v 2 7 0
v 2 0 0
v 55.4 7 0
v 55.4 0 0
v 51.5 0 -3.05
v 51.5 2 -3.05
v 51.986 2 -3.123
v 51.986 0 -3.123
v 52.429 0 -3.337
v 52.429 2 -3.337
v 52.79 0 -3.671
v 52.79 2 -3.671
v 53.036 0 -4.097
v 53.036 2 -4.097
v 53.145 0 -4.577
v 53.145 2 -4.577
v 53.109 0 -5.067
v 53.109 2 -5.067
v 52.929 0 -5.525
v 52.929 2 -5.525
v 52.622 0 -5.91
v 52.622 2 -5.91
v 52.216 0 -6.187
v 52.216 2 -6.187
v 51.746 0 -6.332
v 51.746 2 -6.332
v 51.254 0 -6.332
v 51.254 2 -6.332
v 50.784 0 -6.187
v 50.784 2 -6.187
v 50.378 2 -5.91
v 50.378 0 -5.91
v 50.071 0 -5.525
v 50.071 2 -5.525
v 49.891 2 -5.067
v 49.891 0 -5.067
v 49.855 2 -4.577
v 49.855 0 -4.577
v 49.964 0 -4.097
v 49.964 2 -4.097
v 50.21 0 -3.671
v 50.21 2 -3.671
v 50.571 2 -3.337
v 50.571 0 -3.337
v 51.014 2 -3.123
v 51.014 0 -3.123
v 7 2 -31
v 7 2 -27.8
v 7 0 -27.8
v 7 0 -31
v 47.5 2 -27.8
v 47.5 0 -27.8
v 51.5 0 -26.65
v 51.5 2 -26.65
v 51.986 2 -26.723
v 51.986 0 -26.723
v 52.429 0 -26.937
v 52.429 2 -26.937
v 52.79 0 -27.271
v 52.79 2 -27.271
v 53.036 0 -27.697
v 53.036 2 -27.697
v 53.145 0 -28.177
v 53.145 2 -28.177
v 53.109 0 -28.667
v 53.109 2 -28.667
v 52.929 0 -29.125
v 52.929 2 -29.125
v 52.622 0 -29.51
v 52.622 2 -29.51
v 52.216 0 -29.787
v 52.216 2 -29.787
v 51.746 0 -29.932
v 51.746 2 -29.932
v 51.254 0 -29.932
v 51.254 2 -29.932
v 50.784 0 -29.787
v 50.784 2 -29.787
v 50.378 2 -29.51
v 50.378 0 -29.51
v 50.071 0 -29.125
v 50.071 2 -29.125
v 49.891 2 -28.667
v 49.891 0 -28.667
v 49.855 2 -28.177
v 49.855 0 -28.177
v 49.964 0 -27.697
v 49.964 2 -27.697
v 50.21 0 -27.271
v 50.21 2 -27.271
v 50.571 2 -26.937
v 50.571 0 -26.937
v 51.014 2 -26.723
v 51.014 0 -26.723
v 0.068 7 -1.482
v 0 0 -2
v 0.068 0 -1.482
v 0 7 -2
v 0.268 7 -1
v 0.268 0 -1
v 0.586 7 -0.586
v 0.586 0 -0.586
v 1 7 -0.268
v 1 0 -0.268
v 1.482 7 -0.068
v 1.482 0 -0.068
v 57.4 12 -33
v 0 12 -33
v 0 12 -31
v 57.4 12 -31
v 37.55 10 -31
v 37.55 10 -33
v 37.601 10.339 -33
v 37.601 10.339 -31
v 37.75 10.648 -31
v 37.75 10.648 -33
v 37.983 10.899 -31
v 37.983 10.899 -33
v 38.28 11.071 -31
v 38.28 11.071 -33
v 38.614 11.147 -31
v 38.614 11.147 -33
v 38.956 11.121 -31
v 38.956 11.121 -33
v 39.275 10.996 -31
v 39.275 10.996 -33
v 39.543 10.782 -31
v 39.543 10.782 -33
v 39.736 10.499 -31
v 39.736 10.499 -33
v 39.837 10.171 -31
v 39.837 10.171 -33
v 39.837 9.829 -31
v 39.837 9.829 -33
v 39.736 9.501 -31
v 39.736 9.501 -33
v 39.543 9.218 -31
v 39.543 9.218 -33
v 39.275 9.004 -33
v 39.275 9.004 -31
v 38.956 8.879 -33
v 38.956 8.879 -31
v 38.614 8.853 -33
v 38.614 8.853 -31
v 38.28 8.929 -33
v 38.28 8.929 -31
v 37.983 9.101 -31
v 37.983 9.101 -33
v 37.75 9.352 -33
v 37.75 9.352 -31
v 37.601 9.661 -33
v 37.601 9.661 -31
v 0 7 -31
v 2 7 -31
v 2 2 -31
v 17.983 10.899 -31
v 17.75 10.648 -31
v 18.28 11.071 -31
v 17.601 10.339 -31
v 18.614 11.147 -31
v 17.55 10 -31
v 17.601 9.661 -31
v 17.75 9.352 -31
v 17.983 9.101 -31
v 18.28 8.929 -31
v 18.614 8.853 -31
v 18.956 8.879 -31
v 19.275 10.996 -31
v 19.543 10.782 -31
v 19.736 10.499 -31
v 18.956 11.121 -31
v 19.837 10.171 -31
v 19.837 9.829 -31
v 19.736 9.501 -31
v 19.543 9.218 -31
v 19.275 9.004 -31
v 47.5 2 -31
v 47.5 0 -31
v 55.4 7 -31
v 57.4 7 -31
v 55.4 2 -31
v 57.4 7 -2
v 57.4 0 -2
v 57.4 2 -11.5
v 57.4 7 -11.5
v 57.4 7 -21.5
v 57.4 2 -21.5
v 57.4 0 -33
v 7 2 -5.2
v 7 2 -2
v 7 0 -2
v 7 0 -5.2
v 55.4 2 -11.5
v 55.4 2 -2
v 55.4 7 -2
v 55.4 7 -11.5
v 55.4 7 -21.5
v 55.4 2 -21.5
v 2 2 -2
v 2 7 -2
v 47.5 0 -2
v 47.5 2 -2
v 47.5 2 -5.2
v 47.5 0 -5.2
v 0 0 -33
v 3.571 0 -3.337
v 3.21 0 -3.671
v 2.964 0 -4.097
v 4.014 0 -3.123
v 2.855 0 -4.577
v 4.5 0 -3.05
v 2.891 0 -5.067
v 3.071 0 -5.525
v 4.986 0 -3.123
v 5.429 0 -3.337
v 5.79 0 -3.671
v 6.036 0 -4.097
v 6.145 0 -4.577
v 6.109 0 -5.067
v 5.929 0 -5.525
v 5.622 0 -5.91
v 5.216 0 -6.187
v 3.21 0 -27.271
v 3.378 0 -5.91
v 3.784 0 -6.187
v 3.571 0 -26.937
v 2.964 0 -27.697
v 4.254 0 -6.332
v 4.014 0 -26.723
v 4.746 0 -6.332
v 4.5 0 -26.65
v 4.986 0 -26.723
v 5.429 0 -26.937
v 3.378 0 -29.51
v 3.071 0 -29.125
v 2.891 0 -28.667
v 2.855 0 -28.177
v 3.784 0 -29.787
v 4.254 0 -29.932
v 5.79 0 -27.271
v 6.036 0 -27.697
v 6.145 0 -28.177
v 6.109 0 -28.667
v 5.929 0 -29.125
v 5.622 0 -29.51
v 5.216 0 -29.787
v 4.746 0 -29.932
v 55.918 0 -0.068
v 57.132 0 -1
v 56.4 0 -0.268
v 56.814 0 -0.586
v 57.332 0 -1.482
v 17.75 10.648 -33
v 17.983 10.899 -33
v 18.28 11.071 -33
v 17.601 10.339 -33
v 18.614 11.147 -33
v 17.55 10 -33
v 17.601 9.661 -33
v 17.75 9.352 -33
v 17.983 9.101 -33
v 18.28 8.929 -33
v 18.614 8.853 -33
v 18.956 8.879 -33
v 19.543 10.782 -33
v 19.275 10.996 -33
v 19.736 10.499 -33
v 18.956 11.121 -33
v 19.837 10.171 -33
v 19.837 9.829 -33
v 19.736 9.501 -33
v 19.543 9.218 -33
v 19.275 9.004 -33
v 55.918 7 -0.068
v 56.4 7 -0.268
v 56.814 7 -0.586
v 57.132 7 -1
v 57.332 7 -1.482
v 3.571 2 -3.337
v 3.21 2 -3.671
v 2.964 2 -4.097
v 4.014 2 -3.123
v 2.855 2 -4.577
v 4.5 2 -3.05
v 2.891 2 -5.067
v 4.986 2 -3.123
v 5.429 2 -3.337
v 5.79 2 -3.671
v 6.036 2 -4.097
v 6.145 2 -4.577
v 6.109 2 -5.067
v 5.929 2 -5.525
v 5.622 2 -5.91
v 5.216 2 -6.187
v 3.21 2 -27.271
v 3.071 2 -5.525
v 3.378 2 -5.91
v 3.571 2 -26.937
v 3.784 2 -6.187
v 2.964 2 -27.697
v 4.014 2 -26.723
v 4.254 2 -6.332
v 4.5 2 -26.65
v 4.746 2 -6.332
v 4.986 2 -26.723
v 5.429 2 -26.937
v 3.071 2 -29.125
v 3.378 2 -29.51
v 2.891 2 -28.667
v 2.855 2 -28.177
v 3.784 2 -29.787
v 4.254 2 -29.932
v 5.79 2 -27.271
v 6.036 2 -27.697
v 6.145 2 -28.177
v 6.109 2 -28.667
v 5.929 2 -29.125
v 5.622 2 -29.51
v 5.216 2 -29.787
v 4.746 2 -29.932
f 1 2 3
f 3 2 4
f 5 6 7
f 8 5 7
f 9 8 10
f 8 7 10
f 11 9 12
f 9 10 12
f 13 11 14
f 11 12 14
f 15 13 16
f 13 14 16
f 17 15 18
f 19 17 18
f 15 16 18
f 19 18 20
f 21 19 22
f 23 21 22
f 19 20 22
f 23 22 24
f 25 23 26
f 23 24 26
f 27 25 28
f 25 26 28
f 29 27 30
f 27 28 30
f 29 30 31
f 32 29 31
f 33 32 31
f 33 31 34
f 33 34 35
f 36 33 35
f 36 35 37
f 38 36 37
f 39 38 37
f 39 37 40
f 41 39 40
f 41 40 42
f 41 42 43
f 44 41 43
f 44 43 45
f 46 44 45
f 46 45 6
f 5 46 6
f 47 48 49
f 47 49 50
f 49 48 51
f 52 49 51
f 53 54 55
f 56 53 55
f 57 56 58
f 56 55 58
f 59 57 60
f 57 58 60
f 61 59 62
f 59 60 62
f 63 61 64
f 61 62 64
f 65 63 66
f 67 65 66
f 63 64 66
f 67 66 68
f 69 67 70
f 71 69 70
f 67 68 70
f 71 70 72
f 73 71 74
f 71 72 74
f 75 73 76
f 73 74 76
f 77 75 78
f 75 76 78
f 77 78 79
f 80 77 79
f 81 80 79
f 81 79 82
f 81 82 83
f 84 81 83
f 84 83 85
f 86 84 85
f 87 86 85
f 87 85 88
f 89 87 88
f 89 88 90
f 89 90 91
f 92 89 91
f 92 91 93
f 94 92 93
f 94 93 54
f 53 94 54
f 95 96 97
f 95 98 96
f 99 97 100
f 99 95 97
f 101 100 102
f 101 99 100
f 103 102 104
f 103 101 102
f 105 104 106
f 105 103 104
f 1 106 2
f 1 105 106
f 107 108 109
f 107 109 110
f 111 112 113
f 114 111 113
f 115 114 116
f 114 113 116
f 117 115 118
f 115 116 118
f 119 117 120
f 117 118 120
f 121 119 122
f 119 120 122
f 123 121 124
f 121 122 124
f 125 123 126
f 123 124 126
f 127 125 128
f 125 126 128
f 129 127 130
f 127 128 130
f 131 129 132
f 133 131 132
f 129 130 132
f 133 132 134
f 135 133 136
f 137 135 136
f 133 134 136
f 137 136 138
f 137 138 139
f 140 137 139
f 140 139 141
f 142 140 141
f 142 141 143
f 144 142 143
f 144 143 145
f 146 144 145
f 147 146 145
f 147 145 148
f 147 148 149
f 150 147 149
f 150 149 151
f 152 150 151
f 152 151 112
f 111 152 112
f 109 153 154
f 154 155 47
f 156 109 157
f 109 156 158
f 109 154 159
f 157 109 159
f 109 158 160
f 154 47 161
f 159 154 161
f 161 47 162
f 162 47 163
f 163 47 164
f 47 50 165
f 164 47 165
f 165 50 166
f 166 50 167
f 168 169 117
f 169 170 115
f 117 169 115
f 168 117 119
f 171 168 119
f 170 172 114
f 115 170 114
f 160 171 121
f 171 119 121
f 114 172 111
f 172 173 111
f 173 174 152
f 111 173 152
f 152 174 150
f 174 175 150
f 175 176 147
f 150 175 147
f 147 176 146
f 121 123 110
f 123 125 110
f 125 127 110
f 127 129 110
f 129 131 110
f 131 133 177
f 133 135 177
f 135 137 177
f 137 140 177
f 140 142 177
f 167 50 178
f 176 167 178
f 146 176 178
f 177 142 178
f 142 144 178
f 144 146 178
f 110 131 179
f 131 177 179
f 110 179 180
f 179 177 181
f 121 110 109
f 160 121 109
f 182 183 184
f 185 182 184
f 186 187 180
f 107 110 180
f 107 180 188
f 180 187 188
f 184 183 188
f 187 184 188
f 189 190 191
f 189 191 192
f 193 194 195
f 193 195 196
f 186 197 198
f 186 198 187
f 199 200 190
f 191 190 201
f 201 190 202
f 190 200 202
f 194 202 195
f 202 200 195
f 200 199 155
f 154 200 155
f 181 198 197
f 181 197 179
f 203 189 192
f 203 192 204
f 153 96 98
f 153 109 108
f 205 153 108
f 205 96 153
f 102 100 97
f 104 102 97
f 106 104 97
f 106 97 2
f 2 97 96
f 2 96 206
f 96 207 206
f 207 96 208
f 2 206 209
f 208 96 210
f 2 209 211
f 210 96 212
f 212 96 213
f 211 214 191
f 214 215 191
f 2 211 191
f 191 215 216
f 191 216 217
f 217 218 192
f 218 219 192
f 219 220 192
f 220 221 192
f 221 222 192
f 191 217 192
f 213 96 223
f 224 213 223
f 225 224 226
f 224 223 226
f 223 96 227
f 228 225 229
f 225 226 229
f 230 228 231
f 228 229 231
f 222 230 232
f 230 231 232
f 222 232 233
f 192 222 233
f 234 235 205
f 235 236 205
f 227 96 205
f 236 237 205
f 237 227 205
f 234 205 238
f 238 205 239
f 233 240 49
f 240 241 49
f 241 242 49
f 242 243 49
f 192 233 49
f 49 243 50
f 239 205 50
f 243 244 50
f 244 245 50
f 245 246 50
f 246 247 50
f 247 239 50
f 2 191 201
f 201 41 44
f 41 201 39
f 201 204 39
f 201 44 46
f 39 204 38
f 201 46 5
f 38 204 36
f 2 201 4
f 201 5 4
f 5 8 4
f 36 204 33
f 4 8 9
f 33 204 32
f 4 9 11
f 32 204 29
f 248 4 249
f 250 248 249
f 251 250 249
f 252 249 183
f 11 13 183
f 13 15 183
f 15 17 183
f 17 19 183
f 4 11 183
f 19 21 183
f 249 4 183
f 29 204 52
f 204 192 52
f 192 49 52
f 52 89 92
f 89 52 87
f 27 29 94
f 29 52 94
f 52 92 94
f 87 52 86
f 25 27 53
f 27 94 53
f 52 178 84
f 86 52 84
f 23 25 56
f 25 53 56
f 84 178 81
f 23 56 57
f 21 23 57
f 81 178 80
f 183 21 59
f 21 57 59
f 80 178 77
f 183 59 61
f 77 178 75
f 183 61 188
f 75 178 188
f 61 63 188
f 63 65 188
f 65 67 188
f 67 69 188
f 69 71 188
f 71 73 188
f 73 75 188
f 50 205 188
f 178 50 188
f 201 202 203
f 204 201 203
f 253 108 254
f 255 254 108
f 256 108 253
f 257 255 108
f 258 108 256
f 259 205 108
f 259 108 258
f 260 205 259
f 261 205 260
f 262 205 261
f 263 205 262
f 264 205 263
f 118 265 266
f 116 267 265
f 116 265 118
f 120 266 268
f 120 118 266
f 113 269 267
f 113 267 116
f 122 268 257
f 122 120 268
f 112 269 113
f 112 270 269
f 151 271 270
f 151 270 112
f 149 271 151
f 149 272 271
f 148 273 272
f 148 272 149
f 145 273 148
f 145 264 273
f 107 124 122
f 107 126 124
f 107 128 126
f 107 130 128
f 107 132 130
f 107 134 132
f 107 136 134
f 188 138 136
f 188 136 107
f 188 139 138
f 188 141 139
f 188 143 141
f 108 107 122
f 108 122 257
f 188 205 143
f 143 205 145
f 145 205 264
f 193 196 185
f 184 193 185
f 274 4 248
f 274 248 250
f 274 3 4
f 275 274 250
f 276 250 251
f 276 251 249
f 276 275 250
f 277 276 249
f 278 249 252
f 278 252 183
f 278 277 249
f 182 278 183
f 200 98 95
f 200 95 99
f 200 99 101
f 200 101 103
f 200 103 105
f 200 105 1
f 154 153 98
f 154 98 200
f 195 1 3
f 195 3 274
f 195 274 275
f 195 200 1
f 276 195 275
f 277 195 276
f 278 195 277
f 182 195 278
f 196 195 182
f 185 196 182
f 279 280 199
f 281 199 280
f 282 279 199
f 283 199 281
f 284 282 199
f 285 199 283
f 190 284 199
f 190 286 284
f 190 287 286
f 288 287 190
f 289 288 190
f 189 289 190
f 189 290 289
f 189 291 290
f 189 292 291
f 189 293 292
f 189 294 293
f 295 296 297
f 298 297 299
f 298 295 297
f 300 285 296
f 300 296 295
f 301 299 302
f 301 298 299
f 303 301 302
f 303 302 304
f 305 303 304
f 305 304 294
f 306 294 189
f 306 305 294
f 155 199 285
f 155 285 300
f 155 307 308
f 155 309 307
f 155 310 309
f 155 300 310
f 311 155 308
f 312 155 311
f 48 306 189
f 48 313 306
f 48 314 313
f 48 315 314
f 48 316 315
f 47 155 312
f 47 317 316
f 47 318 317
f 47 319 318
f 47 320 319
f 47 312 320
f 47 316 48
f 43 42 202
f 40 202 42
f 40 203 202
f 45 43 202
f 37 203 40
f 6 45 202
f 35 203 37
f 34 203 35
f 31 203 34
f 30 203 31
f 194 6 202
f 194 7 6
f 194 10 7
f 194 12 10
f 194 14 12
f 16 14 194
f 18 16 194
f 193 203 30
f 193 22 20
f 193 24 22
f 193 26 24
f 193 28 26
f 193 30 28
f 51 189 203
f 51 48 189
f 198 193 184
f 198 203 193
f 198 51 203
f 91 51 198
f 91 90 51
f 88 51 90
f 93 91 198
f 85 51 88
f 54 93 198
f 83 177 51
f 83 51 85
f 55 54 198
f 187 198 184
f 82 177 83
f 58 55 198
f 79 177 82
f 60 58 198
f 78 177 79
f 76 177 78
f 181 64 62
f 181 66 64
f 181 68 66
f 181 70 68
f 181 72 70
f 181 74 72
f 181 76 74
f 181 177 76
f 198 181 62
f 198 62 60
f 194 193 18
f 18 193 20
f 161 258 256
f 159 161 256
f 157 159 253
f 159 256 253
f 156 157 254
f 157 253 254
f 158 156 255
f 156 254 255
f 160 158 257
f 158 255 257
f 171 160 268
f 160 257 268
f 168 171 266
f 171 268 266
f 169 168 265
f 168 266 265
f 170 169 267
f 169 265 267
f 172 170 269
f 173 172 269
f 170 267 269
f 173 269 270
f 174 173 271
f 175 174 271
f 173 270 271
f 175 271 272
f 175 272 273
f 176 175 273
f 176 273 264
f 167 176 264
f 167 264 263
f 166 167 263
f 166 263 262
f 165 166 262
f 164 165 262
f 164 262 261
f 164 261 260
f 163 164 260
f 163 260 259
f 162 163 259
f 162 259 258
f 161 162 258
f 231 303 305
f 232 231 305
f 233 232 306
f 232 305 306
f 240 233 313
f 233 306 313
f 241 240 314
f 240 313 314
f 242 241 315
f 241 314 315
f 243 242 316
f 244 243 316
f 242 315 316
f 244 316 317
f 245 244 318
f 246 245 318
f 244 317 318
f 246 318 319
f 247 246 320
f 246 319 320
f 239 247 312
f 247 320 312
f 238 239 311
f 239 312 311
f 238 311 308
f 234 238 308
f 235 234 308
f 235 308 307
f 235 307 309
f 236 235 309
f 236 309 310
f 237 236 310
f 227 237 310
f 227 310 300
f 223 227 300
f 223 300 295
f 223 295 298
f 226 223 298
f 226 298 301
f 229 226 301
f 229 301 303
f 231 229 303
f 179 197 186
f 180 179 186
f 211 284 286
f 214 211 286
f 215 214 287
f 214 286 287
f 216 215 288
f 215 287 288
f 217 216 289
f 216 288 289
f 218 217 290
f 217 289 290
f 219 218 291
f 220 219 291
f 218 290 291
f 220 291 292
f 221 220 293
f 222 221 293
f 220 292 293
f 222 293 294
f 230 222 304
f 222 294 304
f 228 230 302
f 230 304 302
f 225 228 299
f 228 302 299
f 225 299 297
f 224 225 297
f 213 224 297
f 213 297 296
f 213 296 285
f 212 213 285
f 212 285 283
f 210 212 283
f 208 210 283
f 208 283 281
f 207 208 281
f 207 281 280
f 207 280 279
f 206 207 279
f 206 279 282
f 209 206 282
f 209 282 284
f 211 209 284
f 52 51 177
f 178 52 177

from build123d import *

# Parameters (mm, degrees)
SKETCH1_W           = 57.4
SKETCH1_H           = 33
BOSS_EXTRUDE1_DEPTH = 7
SHELL3_T            = -2
SKETCH2_R           = 1.65
CUT_EXTRUDE1_DEPTH  = 67.398493959
SKETCH3_W           = 40.5
SKETCH3_H           = 3.2
CUT_EXTRUDE2_DEPTH  = 67.398493959
SKETCH4_W           = 2
SKETCH4_H           = 10
CUT_EXTRUDE3_DEPTH  = 5
SKETCH5_W           = 57.4
SKETCH5_H           = 2
BOSS_EXTRUDE2_DEPTH = 5
CUT_EXTRUDE4_REACH  = 69.289
SKETCH6_R           = 1.15
FILLET1_R           = 2


with BuildPart() as part:
    # Sketch1 → Boss-Extrude1 (new body)
    with BuildSketch(Plane(origin=(0, 0, 0), x_dir=(1, 0, 0), z_dir=(0, 1, 0))):
        with Locations((28.7, 16.5)):
            Rectangle(SKETCH1_W, SKETCH1_H)
    extrude(amount=BOSS_EXTRUDE1_DEPTH)

    # Shell3
    shell3_openings = [part.faces().sort_by_distance(p)[0] for p in [
        (28.7, 7, -16.5),
    ]]
    offset(amount=SHELL3_T, openings=shell3_openings, kind=Kind.INTERSECTION)

    # Sketch2 → Cut-Extrude1 (cut, through all)
    with BuildSketch(Plane(origin=(0, 2, 0), x_dir=(1, 0, 0), z_dir=(0, 1, 0))):
        with Locations(Location((4.5, 28.3, 0), (0, 0, 270))):
            Circle(SKETCH2_R)
        with Locations(Location((51.5, 28.3, 0), (0, 0, 270))):
            Circle(SKETCH2_R)
        with Locations(Location((4.5, 4.7, 0), (0, 0, 270))):
            Circle(SKETCH2_R)
        with Locations(Location((51.5, 4.7, 0), (0, 0, 270))):
            Circle(SKETCH2_R)
    extrude(amount=-CUT_EXTRUDE1_DEPTH, mode=Mode.SUBTRACT)

    # Sketch3 → Cut-Extrude2 (cut, through all)
    with BuildSketch(Plane(origin=(0, 2, 0), x_dir=(1, 0, 0), z_dir=(0, 1, 0))):
        with Locations((27.25, 29.4)):
            Rectangle(SKETCH3_W, SKETCH3_H)
        with Locations((27.25, 3.6)):
            Rectangle(SKETCH3_W, SKETCH3_H)
    extrude(amount=-CUT_EXTRUDE2_DEPTH, mode=Mode.SUBTRACT)

    # Sketch4 → Cut-Extrude3 (cut)
    with BuildSketch(Plane(origin=(0, 7, 0), x_dir=(1, 0, 0), z_dir=(0, 1, 0))):
        with Locations((56.4, 16.5)):
            Rectangle(SKETCH4_W, SKETCH4_H)
    extrude(amount=-CUT_EXTRUDE3_DEPTH, mode=Mode.SUBTRACT)

    # Sketch5 → Boss-Extrude2 (add)
    with BuildSketch(Plane(origin=(0, 7, 0), x_dir=(1, 0, 0), z_dir=(0, 1, 0))):
        with Locations((28.7, 32)):
            Rectangle(SKETCH5_W, SKETCH5_H)
    extrude(amount=BOSS_EXTRUDE2_DEPTH)

    # Sketch6 → Cut-Extrude4 (cut, up to next)
    with BuildSketch(Plane(origin=(0, 0, -33), x_dir=(-1, 0, 0), z_dir=(0, 0, -1)), mode=Mode.PRIVATE) as cut_extrude4_sk1:
        with Locations((-38.7, 10)):
            Circle(SKETCH6_R)
    cut_extrude4_tool1 = extrude(cut_extrude4_sk1.sketch, amount=-CUT_EXTRUDE4_REACH, mode=Mode.PRIVATE) & part.part
    # Sketch6 → Cut-Extrude4 (cut, up to next)
    with BuildSketch(Plane(origin=(0, 0, -33), x_dir=(-1, 0, 0), z_dir=(0, 0, -1)), mode=Mode.PRIVATE) as cut_extrude4_sk2:
        with Locations((-18.7, 10)):
            Circle(SKETCH6_R)
    cut_extrude4_tool2 = extrude(cut_extrude4_sk2.sketch, amount=-CUT_EXTRUDE4_REACH, mode=Mode.PRIVATE) & part.part
    add(cut_extrude4_tool1.solids().sort_by_distance((38.7, 10, -33))[0], mode=Mode.SUBTRACT)
    add(cut_extrude4_tool2.solids().sort_by_distance((18.7, 10, -33))[0], mode=Mode.SUBTRACT)

    # Fillet1
    fillet1_edges = [part.edges().sort_by_distance(p)[0] for p in [
        (57.4, 3.5, 0),
        (0, 3.5, 0),
    ]]
    fillet(fillet1_edges, radius=FILLET1_R)


solid = part.part
